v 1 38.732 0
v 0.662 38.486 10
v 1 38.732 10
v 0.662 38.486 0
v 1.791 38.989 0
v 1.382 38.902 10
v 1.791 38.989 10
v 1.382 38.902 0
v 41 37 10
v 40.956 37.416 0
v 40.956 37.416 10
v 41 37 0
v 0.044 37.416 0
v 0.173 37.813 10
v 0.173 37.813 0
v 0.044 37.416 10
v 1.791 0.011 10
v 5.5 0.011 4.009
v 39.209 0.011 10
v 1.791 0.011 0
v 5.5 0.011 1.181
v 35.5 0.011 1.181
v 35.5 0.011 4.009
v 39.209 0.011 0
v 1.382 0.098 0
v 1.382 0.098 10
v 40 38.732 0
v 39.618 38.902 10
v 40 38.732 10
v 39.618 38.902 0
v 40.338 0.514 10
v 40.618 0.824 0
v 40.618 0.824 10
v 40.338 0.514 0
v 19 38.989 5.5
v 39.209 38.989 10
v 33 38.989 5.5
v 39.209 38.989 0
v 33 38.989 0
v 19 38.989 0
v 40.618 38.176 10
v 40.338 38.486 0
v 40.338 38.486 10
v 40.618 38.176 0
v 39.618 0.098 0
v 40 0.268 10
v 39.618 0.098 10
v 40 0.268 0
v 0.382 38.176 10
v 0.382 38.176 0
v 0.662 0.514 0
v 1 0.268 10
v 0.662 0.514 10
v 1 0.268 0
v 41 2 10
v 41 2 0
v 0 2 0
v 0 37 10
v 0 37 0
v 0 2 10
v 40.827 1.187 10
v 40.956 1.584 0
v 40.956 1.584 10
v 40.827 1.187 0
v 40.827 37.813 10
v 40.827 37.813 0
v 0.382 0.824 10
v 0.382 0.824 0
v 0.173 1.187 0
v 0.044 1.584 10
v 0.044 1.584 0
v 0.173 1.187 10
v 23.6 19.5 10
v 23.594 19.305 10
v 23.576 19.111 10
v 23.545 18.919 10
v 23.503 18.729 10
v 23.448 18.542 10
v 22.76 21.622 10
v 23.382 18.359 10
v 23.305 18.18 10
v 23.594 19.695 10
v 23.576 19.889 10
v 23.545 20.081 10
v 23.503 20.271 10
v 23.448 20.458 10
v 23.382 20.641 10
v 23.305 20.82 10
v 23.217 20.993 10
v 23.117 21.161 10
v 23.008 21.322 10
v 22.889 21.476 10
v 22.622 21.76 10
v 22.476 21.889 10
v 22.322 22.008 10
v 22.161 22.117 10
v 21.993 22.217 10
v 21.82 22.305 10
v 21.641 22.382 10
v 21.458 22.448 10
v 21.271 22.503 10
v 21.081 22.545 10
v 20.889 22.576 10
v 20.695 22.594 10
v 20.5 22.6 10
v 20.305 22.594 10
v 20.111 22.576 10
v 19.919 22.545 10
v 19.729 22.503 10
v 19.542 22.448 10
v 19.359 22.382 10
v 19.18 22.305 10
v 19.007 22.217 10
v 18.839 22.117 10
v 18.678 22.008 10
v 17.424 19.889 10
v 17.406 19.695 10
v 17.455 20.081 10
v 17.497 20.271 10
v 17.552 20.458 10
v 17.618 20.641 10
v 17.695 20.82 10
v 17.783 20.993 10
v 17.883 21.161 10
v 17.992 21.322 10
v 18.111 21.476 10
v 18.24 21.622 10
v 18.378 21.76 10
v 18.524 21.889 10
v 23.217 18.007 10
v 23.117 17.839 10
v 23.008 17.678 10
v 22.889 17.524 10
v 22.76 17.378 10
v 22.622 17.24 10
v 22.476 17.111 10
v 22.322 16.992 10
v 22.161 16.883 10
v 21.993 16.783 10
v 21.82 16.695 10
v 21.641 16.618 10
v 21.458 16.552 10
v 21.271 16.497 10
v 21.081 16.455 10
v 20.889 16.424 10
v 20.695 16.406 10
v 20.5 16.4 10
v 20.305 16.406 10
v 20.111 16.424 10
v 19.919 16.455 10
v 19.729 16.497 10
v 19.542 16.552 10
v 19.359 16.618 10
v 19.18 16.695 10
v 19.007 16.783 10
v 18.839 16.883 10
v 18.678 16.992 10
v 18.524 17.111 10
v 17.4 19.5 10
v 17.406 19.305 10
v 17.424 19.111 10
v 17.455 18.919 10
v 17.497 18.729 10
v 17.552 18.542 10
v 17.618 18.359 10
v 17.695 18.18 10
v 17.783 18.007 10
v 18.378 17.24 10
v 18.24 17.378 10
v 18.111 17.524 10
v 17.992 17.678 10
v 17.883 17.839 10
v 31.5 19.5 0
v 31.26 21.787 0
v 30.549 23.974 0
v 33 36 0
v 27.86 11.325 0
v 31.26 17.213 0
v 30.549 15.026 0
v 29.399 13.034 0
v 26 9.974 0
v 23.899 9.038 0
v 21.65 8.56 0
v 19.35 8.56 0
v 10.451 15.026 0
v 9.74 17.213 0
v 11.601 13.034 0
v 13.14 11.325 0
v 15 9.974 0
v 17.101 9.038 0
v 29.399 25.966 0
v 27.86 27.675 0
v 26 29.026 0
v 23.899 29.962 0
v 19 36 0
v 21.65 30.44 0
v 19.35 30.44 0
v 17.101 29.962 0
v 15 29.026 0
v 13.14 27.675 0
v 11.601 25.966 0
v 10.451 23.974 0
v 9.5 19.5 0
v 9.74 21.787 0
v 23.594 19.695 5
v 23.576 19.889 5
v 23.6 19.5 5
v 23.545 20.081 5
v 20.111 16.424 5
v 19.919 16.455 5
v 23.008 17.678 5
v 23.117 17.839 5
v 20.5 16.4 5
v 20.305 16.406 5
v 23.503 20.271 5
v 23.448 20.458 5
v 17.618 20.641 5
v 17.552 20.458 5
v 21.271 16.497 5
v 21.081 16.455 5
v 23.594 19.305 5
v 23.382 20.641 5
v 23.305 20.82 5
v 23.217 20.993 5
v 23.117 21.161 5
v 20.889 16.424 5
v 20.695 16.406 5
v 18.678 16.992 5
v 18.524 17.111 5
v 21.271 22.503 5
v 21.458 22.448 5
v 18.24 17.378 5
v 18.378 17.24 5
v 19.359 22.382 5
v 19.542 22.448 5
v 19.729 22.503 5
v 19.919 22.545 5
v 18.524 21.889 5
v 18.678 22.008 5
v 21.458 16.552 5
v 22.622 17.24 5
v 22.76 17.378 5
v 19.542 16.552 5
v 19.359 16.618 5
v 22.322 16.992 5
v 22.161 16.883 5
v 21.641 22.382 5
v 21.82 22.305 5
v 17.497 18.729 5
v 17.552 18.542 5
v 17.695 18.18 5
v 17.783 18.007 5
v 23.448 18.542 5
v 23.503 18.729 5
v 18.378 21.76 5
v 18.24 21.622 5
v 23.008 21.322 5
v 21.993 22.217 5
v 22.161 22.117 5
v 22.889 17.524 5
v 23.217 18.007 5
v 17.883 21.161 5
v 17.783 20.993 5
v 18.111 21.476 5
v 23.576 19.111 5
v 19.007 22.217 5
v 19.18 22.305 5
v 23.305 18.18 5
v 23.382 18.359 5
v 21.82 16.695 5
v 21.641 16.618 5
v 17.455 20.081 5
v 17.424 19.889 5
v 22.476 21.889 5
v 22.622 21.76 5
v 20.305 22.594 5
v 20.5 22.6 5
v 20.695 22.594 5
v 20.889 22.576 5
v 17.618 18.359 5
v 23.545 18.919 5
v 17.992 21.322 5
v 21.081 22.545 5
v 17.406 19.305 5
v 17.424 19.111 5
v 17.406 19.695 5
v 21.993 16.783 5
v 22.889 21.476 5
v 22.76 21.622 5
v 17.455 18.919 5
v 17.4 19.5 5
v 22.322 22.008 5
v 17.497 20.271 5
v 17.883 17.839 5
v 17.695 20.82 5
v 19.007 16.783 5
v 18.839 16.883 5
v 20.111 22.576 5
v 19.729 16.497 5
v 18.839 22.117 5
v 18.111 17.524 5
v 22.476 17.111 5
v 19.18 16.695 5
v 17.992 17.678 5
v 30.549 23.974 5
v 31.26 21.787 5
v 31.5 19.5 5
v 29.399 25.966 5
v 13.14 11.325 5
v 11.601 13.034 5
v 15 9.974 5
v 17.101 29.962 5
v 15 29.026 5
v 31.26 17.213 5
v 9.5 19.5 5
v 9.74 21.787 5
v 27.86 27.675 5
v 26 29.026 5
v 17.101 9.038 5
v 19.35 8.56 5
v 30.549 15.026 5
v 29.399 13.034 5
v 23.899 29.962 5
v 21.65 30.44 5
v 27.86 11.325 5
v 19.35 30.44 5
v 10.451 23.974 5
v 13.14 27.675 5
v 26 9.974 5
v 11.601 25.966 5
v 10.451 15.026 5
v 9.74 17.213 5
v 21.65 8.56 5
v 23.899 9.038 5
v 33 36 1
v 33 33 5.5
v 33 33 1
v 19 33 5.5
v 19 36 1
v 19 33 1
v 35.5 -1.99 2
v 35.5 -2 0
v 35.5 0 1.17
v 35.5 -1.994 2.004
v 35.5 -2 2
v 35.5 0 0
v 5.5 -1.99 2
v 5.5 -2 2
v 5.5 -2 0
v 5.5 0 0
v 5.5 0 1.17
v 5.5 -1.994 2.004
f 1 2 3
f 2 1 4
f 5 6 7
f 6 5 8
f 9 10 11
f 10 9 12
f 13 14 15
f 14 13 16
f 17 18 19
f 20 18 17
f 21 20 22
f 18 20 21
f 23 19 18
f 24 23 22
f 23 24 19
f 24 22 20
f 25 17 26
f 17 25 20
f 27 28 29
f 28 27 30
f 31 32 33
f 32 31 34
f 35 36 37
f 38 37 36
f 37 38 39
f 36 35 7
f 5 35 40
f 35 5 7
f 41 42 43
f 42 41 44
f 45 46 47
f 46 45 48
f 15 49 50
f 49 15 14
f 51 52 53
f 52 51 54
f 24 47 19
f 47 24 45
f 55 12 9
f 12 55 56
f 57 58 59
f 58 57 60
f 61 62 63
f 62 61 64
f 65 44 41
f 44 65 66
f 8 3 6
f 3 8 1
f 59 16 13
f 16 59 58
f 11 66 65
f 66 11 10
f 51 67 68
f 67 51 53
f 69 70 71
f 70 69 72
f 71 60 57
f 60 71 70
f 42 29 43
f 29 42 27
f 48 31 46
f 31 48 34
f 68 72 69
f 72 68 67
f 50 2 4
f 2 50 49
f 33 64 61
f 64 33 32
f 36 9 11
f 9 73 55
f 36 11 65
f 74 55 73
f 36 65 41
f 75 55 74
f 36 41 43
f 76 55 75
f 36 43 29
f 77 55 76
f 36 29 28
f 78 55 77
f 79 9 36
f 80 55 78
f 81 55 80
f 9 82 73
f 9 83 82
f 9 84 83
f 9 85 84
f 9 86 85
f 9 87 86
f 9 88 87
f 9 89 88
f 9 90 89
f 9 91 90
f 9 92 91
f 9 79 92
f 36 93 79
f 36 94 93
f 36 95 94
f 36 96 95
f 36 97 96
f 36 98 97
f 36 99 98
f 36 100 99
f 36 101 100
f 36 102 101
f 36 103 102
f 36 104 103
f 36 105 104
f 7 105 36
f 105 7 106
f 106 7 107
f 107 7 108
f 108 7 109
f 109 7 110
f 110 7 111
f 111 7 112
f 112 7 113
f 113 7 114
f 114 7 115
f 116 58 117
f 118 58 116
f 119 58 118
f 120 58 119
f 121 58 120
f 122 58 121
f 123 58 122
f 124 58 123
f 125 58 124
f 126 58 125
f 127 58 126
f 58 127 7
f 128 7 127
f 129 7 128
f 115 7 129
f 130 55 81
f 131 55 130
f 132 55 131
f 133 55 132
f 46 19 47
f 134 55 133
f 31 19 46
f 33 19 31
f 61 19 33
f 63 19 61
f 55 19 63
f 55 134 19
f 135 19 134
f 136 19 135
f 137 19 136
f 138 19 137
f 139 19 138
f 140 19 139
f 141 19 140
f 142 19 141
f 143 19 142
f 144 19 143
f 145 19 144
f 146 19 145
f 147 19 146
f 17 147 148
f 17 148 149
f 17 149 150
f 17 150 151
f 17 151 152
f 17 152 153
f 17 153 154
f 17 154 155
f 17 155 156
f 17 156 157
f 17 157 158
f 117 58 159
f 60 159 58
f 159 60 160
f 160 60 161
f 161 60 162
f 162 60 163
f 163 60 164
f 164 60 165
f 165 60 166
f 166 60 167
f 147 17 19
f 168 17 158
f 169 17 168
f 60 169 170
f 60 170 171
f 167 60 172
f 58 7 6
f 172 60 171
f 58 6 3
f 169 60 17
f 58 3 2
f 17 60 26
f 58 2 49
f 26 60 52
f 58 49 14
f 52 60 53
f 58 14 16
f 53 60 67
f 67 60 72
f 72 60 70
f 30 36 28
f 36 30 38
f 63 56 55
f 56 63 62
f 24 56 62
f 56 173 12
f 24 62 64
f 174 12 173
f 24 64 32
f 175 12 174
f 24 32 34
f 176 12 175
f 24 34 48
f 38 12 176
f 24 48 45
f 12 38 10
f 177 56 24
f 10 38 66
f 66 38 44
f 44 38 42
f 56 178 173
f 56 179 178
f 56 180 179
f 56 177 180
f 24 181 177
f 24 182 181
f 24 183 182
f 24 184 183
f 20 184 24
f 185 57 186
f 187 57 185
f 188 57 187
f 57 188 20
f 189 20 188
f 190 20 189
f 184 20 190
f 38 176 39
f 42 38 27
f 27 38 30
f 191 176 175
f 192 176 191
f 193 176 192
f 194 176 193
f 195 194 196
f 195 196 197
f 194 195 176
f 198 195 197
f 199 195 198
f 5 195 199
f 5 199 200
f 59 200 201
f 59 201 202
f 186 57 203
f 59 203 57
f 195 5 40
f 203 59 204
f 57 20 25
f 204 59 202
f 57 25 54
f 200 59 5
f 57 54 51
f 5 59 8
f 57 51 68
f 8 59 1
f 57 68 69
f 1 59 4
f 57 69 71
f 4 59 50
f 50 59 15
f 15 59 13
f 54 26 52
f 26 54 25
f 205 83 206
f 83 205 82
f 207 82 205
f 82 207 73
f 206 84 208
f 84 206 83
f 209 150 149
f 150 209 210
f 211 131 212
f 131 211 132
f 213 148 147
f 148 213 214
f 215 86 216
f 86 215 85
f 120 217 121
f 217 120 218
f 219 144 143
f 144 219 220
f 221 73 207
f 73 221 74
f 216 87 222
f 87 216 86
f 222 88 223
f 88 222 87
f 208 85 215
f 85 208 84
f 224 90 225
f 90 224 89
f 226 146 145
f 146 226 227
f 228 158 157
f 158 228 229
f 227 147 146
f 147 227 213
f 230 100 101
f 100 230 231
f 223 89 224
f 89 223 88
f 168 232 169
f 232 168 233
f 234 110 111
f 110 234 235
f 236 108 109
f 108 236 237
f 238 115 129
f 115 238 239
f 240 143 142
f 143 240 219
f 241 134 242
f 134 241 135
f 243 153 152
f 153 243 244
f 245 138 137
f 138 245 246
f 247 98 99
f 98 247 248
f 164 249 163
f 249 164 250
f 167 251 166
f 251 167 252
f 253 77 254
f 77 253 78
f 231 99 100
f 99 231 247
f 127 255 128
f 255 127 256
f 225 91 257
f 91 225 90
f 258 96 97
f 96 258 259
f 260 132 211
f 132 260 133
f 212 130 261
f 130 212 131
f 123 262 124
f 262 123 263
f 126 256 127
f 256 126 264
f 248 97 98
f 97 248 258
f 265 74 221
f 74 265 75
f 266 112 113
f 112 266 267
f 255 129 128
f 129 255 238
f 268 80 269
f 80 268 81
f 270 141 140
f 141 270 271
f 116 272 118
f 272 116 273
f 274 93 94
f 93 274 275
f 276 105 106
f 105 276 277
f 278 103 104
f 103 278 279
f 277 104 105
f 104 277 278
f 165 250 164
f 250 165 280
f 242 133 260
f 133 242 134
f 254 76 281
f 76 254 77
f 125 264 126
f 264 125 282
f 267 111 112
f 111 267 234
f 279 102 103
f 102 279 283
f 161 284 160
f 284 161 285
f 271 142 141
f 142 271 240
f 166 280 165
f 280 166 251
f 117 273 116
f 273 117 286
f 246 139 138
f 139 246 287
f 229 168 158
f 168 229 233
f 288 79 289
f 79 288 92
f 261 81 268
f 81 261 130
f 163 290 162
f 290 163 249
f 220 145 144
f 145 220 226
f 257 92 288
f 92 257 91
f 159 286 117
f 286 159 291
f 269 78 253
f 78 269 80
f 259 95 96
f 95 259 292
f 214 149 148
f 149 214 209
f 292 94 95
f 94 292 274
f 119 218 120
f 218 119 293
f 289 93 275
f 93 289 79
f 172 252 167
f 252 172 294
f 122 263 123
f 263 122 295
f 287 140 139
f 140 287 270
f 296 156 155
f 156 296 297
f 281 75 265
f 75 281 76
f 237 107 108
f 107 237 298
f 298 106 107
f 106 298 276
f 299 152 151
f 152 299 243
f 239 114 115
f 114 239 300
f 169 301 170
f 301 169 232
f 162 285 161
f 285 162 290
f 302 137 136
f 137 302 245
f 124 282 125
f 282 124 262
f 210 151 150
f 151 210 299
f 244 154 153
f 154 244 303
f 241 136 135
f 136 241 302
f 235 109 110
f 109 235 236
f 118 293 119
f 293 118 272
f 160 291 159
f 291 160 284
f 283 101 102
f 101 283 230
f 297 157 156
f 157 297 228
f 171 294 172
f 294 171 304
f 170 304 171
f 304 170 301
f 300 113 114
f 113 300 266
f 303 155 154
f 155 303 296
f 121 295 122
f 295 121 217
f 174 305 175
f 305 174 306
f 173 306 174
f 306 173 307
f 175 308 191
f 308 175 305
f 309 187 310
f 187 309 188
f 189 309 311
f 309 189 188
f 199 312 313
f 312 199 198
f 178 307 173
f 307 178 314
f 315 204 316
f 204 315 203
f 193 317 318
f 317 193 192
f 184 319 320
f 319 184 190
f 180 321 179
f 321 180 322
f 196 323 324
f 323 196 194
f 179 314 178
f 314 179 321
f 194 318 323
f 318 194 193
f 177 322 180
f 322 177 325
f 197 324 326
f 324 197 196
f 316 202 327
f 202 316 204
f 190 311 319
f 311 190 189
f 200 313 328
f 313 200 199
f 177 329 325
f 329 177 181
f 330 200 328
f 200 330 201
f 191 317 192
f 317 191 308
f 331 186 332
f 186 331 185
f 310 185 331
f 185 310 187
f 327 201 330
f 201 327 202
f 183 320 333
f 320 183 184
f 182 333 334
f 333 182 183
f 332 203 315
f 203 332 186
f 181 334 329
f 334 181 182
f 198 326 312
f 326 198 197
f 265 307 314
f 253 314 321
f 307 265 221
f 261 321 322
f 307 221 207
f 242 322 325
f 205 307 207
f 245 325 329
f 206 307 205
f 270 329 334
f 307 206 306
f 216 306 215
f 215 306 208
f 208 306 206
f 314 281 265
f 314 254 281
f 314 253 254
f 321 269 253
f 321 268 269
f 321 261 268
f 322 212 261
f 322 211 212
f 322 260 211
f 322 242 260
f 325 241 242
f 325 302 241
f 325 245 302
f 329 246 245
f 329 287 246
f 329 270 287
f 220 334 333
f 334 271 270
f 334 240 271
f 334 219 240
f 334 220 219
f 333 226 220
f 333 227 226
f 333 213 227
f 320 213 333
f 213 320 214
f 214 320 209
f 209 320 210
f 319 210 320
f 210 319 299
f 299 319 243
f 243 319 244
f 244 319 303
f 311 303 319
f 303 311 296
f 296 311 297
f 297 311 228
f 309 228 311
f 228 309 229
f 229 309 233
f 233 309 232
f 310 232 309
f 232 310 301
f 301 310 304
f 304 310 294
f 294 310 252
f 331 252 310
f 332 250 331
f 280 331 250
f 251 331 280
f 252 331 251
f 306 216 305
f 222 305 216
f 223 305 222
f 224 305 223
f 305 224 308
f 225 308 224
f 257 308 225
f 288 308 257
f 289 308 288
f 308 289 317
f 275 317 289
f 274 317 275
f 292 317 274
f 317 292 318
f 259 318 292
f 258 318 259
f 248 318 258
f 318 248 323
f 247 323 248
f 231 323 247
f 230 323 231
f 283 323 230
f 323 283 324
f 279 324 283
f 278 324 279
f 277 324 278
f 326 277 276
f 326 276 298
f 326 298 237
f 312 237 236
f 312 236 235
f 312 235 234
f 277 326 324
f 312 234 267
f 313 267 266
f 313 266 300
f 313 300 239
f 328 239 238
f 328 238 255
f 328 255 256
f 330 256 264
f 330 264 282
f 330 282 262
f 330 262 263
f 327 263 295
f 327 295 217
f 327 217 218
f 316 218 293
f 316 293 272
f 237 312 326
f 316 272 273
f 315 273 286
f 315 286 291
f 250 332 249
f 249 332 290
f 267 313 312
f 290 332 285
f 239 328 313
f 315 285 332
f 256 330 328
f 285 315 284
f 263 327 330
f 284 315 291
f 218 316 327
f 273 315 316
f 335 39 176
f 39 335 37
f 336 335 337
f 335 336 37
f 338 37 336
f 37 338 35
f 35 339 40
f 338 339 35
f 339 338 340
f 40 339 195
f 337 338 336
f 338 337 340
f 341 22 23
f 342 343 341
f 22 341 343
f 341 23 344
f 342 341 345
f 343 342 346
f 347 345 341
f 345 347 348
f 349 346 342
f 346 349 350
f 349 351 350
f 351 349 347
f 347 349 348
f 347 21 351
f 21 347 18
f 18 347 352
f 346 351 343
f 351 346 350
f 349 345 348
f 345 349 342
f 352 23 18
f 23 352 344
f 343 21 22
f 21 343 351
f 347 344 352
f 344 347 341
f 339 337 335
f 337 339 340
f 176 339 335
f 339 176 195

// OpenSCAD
// file: ../modules/roundedcube.scad
// Higher definition curves
$fs = 0.01;

module roundedcube(size = [1, 1, 1], center = false, radius = 0.5, apply_to = "all") {
	// If single value, convert to [x, y, z] vector
	size = (size[0] == undef) ? [size, size, size] : size;

	translate_min = radius;
	translate_xmax = size[0] - radius;
	translate_ymax = size[1] - radius;
	translate_zmax = size[2] - radius;

	diameter = radius * 2;

	module build_point(type = "sphere", rotate = [0, 0, 0]) {
		if (type == "sphere") {
			sphere(r = radius);
		} else if (type == "cylinder") {
			rotate(a = rotate)
			cylinder(h = diameter, r = radius, center = true);
		}
	}

	obj_translate = (center == false) ?
		[0, 0, 0] : [
			-(size[0] / 2),
			-(size[1] / 2),
			-(size[2] / 2)
		];

	translate(v = obj_translate) {
		hull() {
			for (translate_x = [translate_min, translate_xmax]) {
				x_at = (translate_x == translate_min) ? "min" : "max";
				for (translate_y = [translate_min, translate_ymax]) {
					y_at = (translate_y == translate_min) ? "min" : "max";
					for (translate_z = [translate_min, translate_zmax]) {
						z_at = (translate_z == translate_min) ? "min" : "max";

						translate(v = [translate_x, translate_y, translate_z])
						if (
							(apply_to == "all") ||
							(apply_to == "xmin" && x_at == "min") || (apply_to == "xmax" && x_at == "max") ||
							(apply_to == "ymin" && y_at == "min") || (apply_to == "ymax" && y_at == "max") ||
							(apply_to == "zmin" && z_at == "min") || (apply_to == "zmax" && z_at == "max")
						) {
							build_point("sphere");
						} else {
							rotate = 
								(apply_to == "xmin" || apply_to == "xmax" || apply_to == "x") ? [0, 90, 0] : (
								(apply_to == "ymin" || apply_to == "ymax" || apply_to == "y") ? [90, 90, 0] :
								[0, 0, 0]
							);
							build_point("cylinder", rotate);
						}
					}
				}
			}
		}
	}
}
// main file
use <./../modules/roundedcube.scad>

difference() {

    roundedcube([41, 39, 10], false, 2, "z");
    
    translate([41/2, 39/2, -1])
    cylinder(h = 12, r = 3.1, $fn = 100);

    translate([41/2, 39/2, -1])
    cylinder(h = 6, r = 11);

    translate([19, 39-6, -1])
    cube([14, 6, 6.5]);
}

translate([41/2-15, -2, 0])
cube([30, 2, 2]);

translate([41/2-15, -0.58, 0.59])
rotate([45,0,0])
cube([30, 10, 2]);

color("pink")
translate([19, 39-6, ])
cube([14, 3, 1]);
